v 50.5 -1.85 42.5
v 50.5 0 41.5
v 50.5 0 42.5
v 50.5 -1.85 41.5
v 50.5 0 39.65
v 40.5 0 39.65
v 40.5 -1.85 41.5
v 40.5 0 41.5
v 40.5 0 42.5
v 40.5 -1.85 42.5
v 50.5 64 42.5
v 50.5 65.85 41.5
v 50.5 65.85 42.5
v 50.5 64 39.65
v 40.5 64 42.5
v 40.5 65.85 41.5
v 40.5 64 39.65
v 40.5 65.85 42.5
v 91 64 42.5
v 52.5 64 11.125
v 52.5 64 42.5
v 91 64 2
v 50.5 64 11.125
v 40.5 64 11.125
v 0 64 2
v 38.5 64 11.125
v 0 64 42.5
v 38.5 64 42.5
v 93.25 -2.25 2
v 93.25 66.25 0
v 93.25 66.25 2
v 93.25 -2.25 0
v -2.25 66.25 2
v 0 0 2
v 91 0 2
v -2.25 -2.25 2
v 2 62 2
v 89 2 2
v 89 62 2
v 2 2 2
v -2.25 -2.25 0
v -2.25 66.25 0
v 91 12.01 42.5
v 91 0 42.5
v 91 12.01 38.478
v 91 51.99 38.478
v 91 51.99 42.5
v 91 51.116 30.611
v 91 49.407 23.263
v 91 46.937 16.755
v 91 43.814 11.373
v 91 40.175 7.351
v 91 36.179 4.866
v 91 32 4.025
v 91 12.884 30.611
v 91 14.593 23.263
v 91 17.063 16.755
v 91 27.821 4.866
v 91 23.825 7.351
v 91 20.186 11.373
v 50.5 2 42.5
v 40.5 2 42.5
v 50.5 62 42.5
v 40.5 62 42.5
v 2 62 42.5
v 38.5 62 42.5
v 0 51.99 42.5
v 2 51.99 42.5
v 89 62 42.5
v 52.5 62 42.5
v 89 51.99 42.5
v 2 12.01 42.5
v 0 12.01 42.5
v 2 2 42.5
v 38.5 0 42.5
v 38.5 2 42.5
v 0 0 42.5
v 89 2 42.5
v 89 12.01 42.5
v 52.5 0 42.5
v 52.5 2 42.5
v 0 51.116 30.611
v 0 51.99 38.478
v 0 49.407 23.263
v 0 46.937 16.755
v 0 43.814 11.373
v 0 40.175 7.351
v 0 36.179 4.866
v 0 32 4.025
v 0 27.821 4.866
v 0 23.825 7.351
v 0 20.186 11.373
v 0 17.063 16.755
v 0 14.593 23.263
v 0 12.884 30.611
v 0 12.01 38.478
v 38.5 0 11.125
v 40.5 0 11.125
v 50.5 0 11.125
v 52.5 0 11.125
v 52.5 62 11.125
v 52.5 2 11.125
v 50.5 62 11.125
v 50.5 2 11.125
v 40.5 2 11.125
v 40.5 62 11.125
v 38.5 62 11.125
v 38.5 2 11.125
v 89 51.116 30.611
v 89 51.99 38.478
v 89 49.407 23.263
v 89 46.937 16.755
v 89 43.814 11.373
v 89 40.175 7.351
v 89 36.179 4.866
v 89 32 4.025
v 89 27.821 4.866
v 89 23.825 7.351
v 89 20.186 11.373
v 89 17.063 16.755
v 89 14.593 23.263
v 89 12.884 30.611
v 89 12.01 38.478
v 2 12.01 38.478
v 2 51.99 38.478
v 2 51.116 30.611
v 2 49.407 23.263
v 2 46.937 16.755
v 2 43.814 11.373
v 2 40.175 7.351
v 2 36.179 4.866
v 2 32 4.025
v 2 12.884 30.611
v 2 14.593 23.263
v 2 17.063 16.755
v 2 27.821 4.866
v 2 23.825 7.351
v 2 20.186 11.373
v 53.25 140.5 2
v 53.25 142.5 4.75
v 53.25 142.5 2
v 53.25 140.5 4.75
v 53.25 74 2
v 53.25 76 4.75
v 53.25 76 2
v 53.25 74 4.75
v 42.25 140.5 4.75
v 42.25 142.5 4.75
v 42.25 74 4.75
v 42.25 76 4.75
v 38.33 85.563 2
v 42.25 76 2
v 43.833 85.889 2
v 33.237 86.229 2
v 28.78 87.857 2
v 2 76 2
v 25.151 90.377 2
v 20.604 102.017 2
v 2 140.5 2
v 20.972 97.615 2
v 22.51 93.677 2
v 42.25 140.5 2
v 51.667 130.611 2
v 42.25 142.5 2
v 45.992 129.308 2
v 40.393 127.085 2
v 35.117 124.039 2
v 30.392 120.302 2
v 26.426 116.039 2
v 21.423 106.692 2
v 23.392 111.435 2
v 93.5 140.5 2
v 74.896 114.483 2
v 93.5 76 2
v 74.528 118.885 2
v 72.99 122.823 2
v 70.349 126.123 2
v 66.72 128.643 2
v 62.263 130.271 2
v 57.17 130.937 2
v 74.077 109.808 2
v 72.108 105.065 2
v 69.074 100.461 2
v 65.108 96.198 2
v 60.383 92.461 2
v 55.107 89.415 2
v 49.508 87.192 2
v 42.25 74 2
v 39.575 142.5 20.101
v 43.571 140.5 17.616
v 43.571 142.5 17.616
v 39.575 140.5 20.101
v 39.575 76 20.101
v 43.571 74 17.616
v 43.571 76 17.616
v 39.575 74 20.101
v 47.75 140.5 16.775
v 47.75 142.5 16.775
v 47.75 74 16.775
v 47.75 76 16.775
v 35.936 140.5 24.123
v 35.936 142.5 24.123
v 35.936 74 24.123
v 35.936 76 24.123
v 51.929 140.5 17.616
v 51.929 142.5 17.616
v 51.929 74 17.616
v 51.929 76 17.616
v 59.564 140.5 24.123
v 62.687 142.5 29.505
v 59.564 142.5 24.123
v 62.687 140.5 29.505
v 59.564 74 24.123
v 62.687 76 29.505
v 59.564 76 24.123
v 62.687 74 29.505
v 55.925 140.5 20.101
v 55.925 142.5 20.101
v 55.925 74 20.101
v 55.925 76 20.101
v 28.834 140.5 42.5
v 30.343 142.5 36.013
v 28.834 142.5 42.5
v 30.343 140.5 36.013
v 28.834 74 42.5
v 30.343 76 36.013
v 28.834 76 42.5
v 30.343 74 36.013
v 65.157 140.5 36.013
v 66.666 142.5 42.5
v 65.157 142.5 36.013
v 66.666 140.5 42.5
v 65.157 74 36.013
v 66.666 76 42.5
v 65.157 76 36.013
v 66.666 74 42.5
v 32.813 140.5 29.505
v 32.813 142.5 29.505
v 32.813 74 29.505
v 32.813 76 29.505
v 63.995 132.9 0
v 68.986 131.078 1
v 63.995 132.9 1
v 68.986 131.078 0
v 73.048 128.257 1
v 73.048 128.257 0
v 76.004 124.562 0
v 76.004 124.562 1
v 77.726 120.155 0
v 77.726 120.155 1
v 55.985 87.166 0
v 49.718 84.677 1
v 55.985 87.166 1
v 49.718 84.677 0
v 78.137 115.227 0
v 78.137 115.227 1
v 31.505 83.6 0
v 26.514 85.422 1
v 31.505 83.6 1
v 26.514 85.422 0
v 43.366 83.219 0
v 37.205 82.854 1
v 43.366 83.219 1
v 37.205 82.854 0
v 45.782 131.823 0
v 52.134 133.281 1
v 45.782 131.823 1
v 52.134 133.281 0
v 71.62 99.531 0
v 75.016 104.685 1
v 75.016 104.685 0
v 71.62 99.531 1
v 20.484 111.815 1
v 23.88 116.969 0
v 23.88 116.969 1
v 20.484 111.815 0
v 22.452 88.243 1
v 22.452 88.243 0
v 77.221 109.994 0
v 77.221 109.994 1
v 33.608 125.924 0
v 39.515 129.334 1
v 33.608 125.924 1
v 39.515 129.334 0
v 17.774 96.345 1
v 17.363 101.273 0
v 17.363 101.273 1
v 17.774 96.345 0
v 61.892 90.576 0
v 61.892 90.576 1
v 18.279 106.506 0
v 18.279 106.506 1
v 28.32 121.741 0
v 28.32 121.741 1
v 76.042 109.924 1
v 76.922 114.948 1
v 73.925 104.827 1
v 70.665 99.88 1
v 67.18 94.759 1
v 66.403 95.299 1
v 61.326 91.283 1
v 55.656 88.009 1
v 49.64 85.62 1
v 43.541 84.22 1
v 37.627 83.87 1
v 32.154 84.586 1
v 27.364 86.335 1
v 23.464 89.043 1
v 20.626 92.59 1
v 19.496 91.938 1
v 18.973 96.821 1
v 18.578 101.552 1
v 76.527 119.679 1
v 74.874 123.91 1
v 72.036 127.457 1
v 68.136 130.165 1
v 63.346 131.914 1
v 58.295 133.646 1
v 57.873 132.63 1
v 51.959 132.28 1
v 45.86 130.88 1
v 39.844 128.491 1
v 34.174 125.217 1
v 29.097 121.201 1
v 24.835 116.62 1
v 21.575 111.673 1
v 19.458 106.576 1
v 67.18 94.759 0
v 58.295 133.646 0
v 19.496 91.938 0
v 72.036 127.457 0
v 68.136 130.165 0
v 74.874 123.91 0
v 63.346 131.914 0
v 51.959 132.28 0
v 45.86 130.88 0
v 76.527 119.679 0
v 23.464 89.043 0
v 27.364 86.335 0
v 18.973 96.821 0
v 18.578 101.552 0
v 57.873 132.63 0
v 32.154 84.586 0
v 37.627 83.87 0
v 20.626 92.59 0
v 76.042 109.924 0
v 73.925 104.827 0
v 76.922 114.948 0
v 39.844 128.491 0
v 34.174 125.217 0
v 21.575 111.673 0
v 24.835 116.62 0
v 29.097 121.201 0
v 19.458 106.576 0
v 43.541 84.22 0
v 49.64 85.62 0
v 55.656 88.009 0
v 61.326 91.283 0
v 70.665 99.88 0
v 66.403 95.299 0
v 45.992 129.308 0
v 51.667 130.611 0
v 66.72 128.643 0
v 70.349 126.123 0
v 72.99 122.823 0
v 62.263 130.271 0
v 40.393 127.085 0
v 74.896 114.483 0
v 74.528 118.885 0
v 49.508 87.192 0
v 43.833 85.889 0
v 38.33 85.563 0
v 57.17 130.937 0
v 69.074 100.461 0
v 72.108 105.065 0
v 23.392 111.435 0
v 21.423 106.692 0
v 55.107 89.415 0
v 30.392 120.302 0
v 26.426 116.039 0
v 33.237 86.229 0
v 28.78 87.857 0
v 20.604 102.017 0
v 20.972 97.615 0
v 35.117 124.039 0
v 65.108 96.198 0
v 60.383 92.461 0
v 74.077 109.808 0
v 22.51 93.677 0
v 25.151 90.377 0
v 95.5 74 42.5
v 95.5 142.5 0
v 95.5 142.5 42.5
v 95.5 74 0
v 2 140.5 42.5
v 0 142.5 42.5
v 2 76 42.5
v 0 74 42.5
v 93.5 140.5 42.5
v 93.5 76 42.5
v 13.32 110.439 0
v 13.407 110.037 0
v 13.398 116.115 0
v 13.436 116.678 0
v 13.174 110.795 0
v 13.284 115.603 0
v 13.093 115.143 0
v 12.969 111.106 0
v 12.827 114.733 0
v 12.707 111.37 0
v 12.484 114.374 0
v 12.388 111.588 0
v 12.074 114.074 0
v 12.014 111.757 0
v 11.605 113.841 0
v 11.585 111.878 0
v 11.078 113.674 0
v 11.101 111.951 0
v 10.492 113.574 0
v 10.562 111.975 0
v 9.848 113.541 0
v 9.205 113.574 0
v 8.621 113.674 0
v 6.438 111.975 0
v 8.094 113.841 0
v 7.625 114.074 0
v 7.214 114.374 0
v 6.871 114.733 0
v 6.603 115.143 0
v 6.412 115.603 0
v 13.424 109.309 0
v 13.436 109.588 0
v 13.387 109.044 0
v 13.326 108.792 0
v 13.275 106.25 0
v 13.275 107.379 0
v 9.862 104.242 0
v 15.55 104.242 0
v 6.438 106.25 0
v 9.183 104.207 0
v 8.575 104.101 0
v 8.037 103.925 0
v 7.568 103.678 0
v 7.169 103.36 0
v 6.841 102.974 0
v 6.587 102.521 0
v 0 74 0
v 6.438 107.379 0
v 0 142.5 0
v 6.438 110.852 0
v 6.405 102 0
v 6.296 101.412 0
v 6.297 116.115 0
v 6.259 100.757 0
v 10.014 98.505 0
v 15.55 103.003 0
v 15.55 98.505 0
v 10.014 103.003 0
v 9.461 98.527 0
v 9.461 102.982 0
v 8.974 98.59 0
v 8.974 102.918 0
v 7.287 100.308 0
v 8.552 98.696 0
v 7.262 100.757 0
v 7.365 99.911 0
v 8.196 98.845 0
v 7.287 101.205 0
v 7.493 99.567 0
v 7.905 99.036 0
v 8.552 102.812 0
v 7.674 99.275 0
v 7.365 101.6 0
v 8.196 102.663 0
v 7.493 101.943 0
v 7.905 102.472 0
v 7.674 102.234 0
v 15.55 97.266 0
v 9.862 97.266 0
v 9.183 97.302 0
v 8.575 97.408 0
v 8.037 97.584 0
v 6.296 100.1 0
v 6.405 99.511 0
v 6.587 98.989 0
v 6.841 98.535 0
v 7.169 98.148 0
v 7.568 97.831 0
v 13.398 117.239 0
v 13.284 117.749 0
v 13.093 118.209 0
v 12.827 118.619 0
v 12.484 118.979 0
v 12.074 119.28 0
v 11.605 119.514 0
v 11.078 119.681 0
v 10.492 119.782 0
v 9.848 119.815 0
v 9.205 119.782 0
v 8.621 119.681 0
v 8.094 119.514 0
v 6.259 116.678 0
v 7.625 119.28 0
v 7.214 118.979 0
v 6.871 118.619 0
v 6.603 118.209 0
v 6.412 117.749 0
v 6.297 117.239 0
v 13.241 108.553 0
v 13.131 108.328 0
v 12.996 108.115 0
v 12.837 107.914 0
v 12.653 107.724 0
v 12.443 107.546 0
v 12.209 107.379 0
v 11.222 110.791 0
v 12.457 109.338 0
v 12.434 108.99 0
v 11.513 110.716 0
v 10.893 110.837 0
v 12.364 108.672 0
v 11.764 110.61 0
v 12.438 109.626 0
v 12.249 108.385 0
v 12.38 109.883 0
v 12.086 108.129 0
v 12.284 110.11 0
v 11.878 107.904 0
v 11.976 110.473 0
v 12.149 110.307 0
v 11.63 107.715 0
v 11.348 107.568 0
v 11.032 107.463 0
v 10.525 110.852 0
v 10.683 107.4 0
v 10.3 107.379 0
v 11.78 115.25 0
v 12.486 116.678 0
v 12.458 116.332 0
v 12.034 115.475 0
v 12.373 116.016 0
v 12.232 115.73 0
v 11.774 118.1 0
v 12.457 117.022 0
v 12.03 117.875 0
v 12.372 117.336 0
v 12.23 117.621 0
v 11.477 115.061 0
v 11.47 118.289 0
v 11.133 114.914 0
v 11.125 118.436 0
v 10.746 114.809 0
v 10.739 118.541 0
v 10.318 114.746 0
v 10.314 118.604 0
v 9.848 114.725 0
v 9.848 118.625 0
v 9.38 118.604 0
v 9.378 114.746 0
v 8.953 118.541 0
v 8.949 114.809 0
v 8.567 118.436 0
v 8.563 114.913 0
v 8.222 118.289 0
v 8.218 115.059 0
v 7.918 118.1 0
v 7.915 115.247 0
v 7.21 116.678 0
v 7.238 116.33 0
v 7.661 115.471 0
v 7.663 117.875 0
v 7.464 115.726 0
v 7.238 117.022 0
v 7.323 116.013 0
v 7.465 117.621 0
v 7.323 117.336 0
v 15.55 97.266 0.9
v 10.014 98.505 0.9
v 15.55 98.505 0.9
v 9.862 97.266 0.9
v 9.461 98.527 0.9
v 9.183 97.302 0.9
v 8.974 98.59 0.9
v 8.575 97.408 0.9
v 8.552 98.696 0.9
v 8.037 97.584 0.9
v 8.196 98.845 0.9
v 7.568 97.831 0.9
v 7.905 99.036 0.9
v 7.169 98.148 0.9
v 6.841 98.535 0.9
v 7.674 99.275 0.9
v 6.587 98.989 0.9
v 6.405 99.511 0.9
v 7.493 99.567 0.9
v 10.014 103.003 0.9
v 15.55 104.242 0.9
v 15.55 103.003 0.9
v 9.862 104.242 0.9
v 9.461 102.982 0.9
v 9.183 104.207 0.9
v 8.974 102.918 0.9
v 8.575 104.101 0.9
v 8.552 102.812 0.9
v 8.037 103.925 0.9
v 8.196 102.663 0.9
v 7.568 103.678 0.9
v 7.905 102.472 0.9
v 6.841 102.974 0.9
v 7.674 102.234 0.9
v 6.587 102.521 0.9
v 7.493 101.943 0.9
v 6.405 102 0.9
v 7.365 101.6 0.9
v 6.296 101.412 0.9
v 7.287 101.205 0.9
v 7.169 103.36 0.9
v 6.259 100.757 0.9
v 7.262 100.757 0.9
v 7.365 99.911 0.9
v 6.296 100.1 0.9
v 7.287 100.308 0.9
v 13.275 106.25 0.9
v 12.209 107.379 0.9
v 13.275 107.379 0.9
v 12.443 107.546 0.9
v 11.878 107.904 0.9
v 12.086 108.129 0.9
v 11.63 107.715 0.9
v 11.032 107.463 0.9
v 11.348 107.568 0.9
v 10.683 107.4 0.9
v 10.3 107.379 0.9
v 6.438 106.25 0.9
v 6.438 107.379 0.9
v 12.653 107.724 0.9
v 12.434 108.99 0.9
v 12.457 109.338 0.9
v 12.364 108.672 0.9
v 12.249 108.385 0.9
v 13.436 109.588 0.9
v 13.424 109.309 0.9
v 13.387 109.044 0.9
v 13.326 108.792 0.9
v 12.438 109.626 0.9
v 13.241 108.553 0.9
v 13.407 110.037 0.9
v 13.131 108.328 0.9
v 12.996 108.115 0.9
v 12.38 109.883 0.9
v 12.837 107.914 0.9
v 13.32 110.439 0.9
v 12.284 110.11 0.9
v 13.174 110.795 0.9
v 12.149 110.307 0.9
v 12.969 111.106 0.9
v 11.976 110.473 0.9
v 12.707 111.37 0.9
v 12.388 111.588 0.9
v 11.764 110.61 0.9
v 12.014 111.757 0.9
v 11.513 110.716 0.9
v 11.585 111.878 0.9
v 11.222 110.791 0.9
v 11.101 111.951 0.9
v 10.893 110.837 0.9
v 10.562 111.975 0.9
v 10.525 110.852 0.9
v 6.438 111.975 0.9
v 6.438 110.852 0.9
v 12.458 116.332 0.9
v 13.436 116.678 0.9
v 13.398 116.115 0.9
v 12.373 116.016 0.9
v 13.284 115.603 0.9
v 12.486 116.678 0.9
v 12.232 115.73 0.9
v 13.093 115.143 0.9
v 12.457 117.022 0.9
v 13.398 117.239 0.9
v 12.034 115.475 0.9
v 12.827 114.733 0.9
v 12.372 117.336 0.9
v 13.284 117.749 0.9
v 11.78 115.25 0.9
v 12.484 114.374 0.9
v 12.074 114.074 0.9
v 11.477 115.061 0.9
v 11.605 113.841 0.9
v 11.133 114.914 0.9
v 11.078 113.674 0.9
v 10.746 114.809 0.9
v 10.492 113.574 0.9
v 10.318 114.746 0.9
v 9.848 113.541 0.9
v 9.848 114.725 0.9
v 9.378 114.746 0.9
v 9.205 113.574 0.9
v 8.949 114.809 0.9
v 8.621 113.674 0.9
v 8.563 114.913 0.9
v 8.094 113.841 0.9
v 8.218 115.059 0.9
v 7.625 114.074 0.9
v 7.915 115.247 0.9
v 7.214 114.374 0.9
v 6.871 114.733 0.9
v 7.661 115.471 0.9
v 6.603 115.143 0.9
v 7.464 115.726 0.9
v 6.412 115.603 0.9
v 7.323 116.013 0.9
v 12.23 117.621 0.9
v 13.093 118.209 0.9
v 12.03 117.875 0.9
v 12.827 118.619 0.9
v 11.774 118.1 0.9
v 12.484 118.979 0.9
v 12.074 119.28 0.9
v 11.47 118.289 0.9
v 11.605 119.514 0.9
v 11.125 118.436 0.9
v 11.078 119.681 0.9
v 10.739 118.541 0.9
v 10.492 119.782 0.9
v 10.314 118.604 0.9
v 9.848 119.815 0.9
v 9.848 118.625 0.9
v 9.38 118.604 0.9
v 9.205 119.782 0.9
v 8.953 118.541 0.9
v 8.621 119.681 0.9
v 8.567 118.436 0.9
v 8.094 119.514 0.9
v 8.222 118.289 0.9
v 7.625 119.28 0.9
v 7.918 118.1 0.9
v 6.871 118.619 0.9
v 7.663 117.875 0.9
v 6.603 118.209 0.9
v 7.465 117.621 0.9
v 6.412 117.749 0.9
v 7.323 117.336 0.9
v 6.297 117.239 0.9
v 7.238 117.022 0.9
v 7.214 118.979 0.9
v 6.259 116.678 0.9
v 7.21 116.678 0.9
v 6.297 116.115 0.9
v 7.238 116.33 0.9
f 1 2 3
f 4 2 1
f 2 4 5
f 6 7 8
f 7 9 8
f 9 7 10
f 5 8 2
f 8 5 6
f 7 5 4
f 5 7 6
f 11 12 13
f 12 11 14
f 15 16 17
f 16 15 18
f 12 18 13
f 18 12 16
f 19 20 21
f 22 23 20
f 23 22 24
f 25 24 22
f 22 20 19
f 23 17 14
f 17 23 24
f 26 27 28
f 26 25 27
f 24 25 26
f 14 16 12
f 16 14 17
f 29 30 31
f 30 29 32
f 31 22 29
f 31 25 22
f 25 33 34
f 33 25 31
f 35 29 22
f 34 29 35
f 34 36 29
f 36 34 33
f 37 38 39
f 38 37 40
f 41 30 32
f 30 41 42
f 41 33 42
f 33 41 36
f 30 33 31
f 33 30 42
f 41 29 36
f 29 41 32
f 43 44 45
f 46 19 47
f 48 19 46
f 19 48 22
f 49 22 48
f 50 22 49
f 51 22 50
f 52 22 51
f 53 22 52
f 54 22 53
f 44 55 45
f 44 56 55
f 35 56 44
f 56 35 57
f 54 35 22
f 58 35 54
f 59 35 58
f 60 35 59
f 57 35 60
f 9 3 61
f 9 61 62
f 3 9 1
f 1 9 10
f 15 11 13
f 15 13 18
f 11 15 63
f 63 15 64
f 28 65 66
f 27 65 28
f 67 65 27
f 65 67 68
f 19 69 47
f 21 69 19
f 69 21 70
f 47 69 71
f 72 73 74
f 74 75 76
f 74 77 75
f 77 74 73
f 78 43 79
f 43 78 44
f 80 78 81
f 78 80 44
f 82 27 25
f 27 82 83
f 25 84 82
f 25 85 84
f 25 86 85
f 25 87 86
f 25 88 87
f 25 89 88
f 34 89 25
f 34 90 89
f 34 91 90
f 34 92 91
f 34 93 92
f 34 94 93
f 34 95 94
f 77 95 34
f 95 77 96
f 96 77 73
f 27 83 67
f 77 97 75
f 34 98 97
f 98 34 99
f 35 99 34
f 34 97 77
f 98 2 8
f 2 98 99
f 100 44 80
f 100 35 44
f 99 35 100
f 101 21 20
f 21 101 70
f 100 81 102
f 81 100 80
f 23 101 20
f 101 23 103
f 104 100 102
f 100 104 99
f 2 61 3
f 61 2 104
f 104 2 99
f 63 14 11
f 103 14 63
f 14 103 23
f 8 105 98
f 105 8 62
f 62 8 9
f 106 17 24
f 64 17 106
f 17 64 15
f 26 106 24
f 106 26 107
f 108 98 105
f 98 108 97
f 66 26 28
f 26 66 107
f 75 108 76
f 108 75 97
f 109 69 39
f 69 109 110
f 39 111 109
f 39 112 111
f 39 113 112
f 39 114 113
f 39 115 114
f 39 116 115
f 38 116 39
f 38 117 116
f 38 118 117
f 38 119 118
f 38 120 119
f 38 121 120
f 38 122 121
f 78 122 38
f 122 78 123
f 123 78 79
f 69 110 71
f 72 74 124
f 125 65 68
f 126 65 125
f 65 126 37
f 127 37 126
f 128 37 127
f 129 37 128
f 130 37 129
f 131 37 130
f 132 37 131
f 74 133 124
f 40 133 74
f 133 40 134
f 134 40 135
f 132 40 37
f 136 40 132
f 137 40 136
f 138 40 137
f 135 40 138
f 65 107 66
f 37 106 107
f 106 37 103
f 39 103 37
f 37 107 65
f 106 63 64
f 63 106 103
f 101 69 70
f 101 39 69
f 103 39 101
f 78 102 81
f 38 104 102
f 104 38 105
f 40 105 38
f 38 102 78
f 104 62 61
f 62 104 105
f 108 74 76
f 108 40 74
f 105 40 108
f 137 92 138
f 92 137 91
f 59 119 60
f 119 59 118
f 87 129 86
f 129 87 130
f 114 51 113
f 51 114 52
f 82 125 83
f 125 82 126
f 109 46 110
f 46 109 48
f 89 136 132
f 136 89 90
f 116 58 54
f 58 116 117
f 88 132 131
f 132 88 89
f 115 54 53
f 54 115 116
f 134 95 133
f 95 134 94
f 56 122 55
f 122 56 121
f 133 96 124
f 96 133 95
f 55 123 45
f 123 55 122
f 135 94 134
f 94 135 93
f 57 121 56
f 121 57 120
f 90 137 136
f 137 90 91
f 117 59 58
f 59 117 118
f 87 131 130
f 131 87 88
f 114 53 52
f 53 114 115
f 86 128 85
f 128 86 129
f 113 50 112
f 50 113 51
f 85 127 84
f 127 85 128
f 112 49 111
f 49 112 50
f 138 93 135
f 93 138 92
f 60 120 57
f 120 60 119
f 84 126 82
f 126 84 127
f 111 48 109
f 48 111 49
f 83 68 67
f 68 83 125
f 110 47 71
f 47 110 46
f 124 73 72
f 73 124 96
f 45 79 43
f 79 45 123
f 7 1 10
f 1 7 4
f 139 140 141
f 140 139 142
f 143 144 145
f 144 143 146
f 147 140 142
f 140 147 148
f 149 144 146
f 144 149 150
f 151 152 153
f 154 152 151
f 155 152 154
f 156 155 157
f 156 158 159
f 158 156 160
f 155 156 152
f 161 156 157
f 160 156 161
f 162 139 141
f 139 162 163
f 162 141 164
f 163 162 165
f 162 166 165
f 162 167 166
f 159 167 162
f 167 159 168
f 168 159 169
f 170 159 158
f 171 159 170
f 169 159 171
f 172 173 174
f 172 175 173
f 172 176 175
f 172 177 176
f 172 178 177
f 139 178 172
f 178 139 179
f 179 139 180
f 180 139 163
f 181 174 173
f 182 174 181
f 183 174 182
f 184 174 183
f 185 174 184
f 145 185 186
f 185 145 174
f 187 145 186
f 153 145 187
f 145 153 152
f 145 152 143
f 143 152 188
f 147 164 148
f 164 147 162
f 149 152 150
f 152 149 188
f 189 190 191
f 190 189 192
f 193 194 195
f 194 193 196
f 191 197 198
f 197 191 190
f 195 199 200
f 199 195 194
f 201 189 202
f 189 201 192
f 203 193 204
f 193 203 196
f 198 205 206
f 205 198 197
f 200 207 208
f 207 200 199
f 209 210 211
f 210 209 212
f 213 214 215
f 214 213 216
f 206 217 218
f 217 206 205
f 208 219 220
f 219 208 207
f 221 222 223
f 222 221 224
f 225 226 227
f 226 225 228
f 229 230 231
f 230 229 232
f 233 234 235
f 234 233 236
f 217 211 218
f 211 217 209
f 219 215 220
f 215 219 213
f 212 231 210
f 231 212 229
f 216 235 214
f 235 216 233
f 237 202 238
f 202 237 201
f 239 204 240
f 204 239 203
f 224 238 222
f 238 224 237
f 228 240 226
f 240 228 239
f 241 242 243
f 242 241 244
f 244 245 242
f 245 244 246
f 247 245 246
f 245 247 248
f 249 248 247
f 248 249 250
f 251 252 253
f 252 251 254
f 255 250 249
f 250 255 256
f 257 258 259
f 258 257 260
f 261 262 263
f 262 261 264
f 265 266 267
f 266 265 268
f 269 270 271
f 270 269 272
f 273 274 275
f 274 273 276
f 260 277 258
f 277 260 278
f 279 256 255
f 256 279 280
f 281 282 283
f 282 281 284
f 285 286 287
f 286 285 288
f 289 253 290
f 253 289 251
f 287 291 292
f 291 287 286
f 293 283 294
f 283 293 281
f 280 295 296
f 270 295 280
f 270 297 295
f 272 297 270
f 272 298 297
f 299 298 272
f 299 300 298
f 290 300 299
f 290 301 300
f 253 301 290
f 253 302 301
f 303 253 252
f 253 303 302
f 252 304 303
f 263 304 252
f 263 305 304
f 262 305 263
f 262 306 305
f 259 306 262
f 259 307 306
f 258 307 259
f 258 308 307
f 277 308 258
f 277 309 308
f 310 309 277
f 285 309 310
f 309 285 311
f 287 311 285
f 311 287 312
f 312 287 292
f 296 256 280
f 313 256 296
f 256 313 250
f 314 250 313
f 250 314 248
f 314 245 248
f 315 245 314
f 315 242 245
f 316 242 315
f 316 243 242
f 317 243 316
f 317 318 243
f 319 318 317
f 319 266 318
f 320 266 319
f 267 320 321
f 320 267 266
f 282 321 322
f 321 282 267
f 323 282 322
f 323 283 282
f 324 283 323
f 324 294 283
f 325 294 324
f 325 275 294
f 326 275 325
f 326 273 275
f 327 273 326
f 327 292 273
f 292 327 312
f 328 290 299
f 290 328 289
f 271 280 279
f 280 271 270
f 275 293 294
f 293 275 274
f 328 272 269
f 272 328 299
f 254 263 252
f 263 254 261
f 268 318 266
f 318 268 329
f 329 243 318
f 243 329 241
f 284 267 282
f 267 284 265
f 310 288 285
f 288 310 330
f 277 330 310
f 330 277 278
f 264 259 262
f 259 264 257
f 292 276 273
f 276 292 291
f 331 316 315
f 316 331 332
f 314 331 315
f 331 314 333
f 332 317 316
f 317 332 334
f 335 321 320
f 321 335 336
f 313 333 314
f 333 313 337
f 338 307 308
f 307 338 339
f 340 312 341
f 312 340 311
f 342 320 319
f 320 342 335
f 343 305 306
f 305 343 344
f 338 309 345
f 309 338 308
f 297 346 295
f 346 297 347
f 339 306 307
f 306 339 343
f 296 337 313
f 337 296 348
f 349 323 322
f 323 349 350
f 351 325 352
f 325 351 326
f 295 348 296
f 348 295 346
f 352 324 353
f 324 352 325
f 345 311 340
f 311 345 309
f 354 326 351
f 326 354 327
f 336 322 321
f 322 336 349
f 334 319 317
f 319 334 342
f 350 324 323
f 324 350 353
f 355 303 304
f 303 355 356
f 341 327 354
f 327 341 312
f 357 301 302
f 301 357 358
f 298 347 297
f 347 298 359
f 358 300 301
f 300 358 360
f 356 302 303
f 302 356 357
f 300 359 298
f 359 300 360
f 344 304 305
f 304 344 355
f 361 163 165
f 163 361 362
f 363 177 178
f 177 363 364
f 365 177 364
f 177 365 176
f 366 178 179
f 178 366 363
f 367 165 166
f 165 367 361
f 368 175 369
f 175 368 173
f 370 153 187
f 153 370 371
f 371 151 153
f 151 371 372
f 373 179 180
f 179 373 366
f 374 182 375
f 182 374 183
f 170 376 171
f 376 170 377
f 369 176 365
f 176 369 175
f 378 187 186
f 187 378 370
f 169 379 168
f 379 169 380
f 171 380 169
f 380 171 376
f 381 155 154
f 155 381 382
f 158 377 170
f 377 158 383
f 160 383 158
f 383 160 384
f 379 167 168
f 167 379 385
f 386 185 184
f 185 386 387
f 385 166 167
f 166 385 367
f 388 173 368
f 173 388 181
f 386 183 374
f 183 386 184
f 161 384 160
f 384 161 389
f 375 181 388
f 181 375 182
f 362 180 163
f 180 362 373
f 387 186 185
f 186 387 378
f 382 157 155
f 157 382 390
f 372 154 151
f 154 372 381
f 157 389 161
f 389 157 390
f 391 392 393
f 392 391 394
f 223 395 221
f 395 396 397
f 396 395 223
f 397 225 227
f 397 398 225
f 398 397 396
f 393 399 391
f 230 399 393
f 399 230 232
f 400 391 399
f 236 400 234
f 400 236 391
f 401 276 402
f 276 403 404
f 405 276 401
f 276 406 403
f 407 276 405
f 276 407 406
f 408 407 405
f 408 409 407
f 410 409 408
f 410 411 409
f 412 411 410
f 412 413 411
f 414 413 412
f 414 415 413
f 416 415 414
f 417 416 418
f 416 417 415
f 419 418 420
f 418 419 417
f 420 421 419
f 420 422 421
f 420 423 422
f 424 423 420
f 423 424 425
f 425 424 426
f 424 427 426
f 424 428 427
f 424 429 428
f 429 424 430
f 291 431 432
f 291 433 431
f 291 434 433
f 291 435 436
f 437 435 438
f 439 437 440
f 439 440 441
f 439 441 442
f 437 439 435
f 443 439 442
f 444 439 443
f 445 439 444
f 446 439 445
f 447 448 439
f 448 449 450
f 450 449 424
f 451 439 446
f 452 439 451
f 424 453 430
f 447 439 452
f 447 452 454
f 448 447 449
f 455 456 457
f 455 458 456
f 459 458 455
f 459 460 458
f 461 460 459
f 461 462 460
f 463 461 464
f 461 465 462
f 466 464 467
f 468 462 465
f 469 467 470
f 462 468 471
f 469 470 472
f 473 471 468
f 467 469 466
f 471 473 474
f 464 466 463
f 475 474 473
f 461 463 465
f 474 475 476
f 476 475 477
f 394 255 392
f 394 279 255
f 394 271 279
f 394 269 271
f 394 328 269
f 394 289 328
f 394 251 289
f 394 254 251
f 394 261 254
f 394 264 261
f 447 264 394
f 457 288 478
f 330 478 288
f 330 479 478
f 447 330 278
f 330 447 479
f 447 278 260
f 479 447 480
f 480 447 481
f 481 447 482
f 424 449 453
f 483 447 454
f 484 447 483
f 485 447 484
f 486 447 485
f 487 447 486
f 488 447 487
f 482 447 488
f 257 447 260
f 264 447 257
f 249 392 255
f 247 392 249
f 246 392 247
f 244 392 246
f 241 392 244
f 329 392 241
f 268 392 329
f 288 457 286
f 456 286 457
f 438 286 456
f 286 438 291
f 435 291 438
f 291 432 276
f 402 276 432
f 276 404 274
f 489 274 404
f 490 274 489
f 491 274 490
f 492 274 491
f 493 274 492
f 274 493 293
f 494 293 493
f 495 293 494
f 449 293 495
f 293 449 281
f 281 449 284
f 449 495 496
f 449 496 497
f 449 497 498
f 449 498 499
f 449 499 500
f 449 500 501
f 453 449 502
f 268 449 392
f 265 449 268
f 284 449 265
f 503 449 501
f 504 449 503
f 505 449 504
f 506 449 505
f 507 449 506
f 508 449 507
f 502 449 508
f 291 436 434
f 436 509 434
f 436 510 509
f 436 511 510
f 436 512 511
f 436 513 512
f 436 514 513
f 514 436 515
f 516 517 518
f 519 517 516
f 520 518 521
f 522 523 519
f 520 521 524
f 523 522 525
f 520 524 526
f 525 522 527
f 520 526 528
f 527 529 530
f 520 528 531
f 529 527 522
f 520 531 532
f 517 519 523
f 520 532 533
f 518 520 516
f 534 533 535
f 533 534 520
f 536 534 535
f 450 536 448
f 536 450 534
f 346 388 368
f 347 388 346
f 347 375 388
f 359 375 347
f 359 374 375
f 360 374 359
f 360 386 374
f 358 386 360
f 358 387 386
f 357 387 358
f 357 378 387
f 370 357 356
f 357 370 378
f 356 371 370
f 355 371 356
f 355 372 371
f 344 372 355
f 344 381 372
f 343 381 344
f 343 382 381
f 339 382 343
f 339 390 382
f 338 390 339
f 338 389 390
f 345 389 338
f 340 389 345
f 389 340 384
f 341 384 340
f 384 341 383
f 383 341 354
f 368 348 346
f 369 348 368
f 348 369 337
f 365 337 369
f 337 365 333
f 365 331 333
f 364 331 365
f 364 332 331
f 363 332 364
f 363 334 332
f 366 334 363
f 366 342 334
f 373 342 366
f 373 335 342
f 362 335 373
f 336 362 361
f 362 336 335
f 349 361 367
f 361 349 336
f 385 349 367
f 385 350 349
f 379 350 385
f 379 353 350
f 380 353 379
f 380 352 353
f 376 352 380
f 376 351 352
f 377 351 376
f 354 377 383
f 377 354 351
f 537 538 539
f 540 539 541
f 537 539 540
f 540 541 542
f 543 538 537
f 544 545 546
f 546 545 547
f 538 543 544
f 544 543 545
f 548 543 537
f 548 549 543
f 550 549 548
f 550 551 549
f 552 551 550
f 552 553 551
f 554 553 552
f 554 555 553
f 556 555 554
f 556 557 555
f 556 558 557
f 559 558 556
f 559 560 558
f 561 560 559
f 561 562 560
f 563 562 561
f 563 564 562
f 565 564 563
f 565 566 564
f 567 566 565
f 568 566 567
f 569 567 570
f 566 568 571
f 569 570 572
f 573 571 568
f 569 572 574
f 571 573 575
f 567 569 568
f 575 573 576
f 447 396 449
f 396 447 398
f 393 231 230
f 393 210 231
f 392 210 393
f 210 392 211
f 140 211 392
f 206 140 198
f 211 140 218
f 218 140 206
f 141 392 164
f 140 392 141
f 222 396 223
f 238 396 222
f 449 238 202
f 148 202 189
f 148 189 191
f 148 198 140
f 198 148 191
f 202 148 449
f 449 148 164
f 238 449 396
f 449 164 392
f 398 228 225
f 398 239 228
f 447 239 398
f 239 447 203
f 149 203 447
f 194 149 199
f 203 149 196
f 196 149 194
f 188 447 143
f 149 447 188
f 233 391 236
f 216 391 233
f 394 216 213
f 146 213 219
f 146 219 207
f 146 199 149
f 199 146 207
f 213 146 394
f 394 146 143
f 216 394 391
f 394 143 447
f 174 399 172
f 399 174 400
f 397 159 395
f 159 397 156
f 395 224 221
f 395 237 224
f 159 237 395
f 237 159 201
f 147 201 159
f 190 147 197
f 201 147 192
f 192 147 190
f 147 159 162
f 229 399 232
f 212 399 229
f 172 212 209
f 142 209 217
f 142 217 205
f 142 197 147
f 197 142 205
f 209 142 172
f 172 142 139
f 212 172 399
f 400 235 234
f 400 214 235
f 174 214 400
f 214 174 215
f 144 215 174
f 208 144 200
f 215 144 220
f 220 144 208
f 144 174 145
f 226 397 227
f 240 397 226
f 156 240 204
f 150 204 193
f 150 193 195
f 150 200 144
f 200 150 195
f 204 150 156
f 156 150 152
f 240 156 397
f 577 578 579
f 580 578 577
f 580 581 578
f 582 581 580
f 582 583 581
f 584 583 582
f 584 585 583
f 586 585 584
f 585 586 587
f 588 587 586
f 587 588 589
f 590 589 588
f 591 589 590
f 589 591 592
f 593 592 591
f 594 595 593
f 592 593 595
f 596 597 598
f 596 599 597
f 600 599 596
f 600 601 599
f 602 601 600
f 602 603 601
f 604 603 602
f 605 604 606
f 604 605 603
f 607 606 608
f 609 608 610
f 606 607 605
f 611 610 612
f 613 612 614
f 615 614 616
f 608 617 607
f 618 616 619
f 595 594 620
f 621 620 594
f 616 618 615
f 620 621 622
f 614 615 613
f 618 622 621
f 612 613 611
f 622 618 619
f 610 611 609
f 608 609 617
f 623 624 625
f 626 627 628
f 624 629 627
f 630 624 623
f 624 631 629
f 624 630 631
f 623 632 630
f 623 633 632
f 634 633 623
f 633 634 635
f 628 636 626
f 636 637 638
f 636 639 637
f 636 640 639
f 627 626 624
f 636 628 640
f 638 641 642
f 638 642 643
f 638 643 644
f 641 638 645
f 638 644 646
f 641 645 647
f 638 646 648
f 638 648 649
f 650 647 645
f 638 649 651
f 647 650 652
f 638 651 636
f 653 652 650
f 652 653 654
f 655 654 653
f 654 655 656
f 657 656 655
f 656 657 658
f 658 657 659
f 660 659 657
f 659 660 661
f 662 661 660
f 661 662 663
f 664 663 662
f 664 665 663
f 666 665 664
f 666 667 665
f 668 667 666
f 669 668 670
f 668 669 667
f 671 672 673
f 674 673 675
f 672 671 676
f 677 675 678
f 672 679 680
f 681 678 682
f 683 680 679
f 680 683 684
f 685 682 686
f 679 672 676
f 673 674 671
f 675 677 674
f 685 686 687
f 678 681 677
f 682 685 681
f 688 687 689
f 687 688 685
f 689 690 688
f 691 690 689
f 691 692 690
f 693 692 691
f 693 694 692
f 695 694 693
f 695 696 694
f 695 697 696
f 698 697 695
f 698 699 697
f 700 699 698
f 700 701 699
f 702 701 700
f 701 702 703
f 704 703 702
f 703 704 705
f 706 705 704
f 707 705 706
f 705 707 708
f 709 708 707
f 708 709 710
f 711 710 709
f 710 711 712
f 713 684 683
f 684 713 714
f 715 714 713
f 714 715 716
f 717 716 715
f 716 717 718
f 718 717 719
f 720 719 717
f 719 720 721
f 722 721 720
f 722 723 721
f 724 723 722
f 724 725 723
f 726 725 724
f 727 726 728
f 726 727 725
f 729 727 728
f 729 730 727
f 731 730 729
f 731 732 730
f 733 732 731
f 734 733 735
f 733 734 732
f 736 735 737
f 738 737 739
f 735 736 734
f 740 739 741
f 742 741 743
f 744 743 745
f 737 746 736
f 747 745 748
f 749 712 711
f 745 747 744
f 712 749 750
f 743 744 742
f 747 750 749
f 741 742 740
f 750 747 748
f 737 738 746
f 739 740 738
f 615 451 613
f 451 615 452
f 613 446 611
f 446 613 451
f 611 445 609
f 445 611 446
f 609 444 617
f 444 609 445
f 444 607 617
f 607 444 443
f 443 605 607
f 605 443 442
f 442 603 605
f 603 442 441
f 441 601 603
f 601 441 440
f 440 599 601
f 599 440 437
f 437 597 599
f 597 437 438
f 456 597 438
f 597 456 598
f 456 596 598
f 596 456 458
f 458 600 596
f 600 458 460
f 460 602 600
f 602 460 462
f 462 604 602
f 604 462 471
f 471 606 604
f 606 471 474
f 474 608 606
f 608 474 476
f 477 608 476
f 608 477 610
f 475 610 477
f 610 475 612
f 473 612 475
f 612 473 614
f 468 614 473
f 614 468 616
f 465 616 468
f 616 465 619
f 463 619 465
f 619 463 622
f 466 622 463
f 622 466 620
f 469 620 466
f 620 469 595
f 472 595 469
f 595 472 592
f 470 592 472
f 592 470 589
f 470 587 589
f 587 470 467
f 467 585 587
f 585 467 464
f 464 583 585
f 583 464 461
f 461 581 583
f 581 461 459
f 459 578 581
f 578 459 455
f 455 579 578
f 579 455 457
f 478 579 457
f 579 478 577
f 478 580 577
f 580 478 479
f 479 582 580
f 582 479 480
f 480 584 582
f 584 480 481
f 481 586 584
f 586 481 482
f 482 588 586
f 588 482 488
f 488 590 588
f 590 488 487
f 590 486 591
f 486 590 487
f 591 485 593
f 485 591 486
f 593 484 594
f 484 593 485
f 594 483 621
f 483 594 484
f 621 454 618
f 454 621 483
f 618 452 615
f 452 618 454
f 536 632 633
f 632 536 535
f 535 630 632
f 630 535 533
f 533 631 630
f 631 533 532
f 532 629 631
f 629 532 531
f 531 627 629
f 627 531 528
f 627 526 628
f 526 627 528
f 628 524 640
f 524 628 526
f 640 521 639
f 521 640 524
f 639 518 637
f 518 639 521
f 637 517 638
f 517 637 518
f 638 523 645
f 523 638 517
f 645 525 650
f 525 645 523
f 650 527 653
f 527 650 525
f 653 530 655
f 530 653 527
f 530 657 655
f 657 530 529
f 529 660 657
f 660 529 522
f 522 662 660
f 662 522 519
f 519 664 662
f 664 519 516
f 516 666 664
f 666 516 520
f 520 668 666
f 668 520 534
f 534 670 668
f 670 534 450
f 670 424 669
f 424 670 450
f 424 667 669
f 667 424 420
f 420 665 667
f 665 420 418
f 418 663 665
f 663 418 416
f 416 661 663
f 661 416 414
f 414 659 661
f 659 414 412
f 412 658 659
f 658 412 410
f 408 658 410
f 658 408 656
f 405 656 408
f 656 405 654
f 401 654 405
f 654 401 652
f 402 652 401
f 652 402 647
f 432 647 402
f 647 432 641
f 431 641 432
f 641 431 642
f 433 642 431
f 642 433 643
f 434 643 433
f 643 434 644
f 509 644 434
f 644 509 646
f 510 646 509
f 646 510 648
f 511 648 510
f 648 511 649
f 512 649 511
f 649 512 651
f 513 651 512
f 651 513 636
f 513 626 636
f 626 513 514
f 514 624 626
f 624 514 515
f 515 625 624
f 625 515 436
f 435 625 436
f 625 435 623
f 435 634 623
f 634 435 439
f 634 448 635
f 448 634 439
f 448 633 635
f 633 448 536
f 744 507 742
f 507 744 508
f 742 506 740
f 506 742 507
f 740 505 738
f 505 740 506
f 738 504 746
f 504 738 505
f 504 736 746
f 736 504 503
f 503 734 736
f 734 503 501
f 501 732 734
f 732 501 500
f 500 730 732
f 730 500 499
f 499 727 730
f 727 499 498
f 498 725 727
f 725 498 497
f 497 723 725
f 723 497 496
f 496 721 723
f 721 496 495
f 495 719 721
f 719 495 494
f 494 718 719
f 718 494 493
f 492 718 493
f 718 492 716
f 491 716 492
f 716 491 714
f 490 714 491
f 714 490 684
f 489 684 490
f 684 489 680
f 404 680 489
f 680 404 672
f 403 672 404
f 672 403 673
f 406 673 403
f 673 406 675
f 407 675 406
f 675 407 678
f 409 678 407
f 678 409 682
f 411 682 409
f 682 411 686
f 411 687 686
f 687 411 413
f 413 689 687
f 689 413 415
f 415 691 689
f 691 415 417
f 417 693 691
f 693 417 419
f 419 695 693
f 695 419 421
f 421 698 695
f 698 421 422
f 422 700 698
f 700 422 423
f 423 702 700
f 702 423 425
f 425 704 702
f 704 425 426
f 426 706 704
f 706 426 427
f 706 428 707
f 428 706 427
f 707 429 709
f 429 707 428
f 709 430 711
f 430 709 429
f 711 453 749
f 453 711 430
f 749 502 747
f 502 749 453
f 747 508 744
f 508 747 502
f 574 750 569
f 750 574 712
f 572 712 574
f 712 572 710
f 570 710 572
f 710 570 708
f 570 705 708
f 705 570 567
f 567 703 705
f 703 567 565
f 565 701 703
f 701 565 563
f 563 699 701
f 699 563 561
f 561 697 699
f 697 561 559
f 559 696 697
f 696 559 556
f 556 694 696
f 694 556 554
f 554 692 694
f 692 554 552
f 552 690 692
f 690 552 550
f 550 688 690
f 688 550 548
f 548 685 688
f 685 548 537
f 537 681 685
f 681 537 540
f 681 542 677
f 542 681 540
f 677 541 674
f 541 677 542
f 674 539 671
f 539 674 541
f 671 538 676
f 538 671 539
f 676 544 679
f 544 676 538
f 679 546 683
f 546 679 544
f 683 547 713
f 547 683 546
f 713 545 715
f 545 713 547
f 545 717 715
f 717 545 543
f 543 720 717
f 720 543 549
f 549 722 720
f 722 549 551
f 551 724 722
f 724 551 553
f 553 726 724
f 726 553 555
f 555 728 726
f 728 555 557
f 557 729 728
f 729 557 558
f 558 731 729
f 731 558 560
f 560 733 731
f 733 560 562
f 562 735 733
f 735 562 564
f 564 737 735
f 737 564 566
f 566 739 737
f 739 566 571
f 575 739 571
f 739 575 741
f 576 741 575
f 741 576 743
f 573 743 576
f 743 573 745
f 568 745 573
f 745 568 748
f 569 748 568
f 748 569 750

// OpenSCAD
//Type to print
type="both"; //[bottom,top,both]



//UNO-Full-Stack:    
Long_edge=85.5; Short_edge=55.3; Height=39;

//UNO-Junior (bigger cards, smaller stack)
//Long_edge=90; Short_edge=59; Height=17;


wiggle=1.5;

//Width of the tab which keeps the two halfes together
TAB_THICKNESS = 10;

//wedge size at end of tab. Has to be less than "wall_thickness" above!
Wedge_thickness=1.6;
    
//Card size long edge
CARD_SIZE_LONG_EDGE =Long_edge+wiggle;

//Card size short edge
CARD_SIZE_SHORT_EDGE = Short_edge+wiggle+2*Wedge_thickness;

//Card stack total height
CARD_STACK_HEIGHT = Height+wiggle  ;

//Wall thickness of the box, e.g. 2mm
WALL_THICKNESS = 2;

//wiggle space so the boxes slide easily on top of each other.
EXTRA_SPACE = .25;

//Is there a hole in the top?
Cutout_hole_top = "true"; //[true, false]

//Is there a hole in the bottom?
Cutout_hole_bottom = "false"; //[true, false]

//Angle of the cutout (looks nice)
Cutout_angle=30;

//Set the text to render on the top lid
Top_Text = "Uno";
 
//Bottom text
Bottom_Text = "";

//Set text size in mm
textsize=9; 

//Font name, e.g. "Libration Sans", "Aldo", depends on what is available on the platform. In the customizer,choose from about 700 Google Fonts. For an overview please refer: http://www.google.com/fonts
fontname="Orbitron"; //[ABeeZee,Abel,Abril Fatface,Aclonica,Acme,Actor,Adamina,Advent Pro,Aguafina Script,Akronim,Aladin,Aldrich,Alef,Alegreya,Alegreya Sans,Alegreya Sans SC,Alegreya SC,Alex Brush,Alfa Slab One,Alice,Alike,Alike Angular,Allan,Allerta,Allerta Stencil,Allura,Almendra,Almendra Display,Almendra SC,Amarante,Amaranth,Amatic SC,Amethysta,Amiri,Anaheim,Andada,Andika,Angkor,Annie Use Your Telescope,Anonymous Pro,Antic,Antic Didone,Antic Slab,Anton,Arapey,Arbutus,Arbutus Slab,Architects Daughter,Archivo Black,Archivo Narrow,Arimo,Arizonia,Armata,Artifika,Arvo,Asap,Asset,Astloch,Asul,Atomic Age,Aubrey,Audiowide,Autour One,Average,Average Sans,Averia Gruesa Libre,Averia Libre,Averia Sans Libre,Averia Serif Libre,Bad Script,Balthazar,Bangers,Basic,Battambang,Baumans,Bayon,Belgrano,Belleza,BenchNine,Bentham,Berkshire Swash,Bevan,Bigelow Rules,Bigshot One,Bilbo,Bilbo Swash Caps,Bitter,Black Ops One,Bokor,Bonbon,Boogaloo,Bowlby One,Bowlby One SC,Brawler,Bree Serif,Bubblegum Sans,Bubbler One,Buda,Buenard,Butcherman,Butterfly Kids,Cabin,Cabin Condensed,Cabin Sketch,Caesar Dressing,Cagliostro,Calligraffitti,Cambay,Cambo,Candal,Cantarell,Cantata One,Cantora One,Capriola,Cardo,Carme,Carrois Gothic,Carrois Gothic SC,Carter One,Caudex,Cedarville Cursive,Ceviche One,Changa One,Chango,Chau Philomene One,Chela One,Chelsea Market,Chenla,Cherry Cream Soda,Cherry Swash,Chewy,Chicle,Chivo,Cinzel,Cinzel Decorative,Clicker Script,Coda,Coda Caption,Codystar,Combo,Comfortaa,Coming Soon,Concert One,Condiment,Content,Contrail One,Convergence,Cookie,Copse,Corben,Courgette,Cousine,Coustard,Covered By Your Grace,Crafty Girls,Creepster,Crete Round,Crimson Text,Croissant One,Crushed,Cuprum,Cutive,Cutive Mono,Damion,Dancing Script,Dangrek,Dawning of a New Day,Days One,Dekko,Delius,Delius Swash Caps,Delius Unicase,Della Respira,Denk One,Devonshire,Dhurjati,Didact Gothic,Diplomata,Diplomata SC,Domine,Donegal One,Doppio One,Dorsa,Dosis,Dr Sugiyama,Droid Sans,Droid Sans Mono,Droid Serif,Duru Sans,Dynalight,Eagle Lake,Eater,EB Garamond,Economica,Ek Mukta,Electrolize,Elsie,Elsie Swash Caps,Emblema One,Emilys Candy,Engagement,Englebert,Enriqueta,Erica One,Esteban,Euphoria Script,Ewert,Exo,Exo 2,Expletus Sans,Fanwood Text,Fascinate,Fascinate Inline,Faster One,Fasthand,Fauna One,Federant,Federo,Felipa,Fenix,Finger Paint,Fira Mono,Fira Sans,Fjalla One,Fjord One,Flamenco,Flavors,Fondamento,Fontdiner Swanky,Forum,Francois One,Freckle Face,Fredericka the Great,Fredoka One,Freehand,Fresca,Frijole,Fruktur,Fugaz One,Gabriela,Gafata,Galdeano,Galindo,Gentium Basic,Gentium Book Basic,Geo,Geostar,Geostar Fill,Germania One,GFS Didot,GFS Neohellenic,Gidugu,Gilda Display,Give You Glory,Glass Antiqua,Glegoo,Gloria Hallelujah,Goblin One,Gochi Hand,Gorditas,Goudy Bookletter 1911,Graduate,Grand Hotel,Gravitas One,Great Vibes,Griffy,Gruppo,Gudea,Gurajada,Habibi,Halant,Hammersmith One,Hanalei,Hanalei Fill,Handlee,Hanuman,Happy Monkey,Headland One,Henny Penny,Herr Von Muellerhoff,Hind,Holtwood One SC,Homemade Apple,Homenaje,Iceberg,Iceland,IM Fell Double Pica,IM Fell Double Pica SC,IM Fell DW Pica,IM Fell DW Pica SC,IM Fell English,IM Fell English SC,IM Fell French Canon,IM Fell French Canon SC,IM Fell Great Primer,IM Fell Great Primer SC,Imprima,Inconsolata,Inder,Indie Flower,Inika,Irish Grover,Istok Web,Italiana,Italianno,Jacques Francois,Jacques Francois Shadow,Jim Nightshade,Jockey One,Jolly Lodger,Josefin Sans,Josefin Slab,Joti One,Judson,Julee,Julius Sans One,Junge,Jura,Just Another Hand,Just Me Again Down Here,Kalam,Kameron,Kantumruy,Karla,Karma,Kaushan Script,Kavoon,Kdam Thmor,Keania One,Kelly Slab,Kenia,Khand,Khmer,Khula,Kite One,Knewave,Kotta One,Koulen,Kranky,Kreon,Kristi,Krona One,La Belle Aurore,Laila,Lakki Reddy,Lancelot,Lateef,Lato,League Script,Leckerli One,Ledger,Lekton,Lemon,Liberation Sans,Libre Baskerville,Life Savers,Lilita One,Lily Script One,Limelight,Linden Hill,Lobster,Lobster Two,Londrina Outline,Londrina Shadow,Londrina Sketch,Londrina Solid,Lora,Love Ya Like A Sister,Loved by the King,Lovers Quarrel,Luckiest Guy,Lusitana,Lustria,Macondo,Macondo Swash Caps,Magra,Maiden Orange,Mako,Mallanna,Mandali,Marcellus,Marcellus SC,Marck Script,Margarine,Marko One,Marmelad,Martel Sans,Marvel,Mate,Mate SC,Maven Pro,McLaren,Meddon,MedievalSharp,Medula One,Megrim,Meie Script,Merienda,Merienda One,Merriweather,Merriweather Sans,Metal,Metal Mania,Metamorphous,Metrophobic,Michroma,Milonga,Miltonian,Miltonian Tattoo,Miniver,Miss Fajardose,Modak,Modern Antiqua,Molengo,Molle,Monda,Monofett,Monoton,Monsieur La Doulaise,Montaga,Montez,Montserrat,Montserrat Alternates,Montserrat Subrayada,Moul,Moulpali,Mountains of Christmas,Mouse Memoirs,Mr Bedfort,Mr Dafoe,Mr De Haviland,Mrs Saint Delafield,Mrs Sheppards,Muli,Mystery Quest,Neucha,Neuton,New Rocker,News Cycle,Niconne,Nixie One,Nobile,Nokora,Norican,Nosifer,Nothing You Could Do,Noticia Text,Noto Sans,Noto Serif,Nova Cut,Nova Flat,Nova Mono,Nova Oval,Nova Round,Nova Script,Nova Slim,Nova Square,NTR,Numans,Nunito,Odor Mean Chey,Offside,Old Standard TT,Oldenburg,Oleo Script,Oleo Script Swash Caps,Open Sans,Open Sans Condensed,Oranienbaum,Orbitron,Oregano,Orienta,Original Surfer,Oswald,Over the Rainbow,Overlock,Overlock SC,Ovo,Oxygen,Oxygen Mono,Pacifico,Paprika,Parisienne,Passero One,Passion One,Pathway Gothic One,Patrick Hand,Patrick Hand SC,Patua One,Paytone One,Peddana,Peralta,Permanent Marker,Petit Formal Script,Petrona,Philosopher,Piedra,Pinyon Script,Pirata One,Plaster,Play,Playball,Playfair Display,Playfair Display SC,Podkova,Poiret One,Poller One,Poly,Pompiere,Pontano Sans,Port Lligat Sans,Port Lligat Slab,Prata,Preahvihear,Press Start 2P,Princess Sofia,Prociono,Prosto One,PT Mono,PT Sans,PT Sans Caption,PT Sans Narrow,PT Serif,PT Serif Caption,Puritan,Purple Purse,Quando,Quantico,Quattrocento,Quattrocento Sans,Questrial,Quicksand,Quintessential,Qwigley,Racing Sans One,Radley,Rajdhani,Raleway,Raleway Dots,Ramabhadra,Ramaraja,Rambla,Rammetto One,Ranchers,Rancho,Ranga,Rationale,Ravi Prakash,Redressed,Reenie Beanie,Revalia,Ribeye,Ribeye Marrow,Righteous,Risque,Roboto,Roboto Condensed,Roboto Slab,Rochester,Rock Salt,Rokkitt,Romanesco,Ropa Sans,Rosario,Rosarivo,Rouge Script,Rozha One,Rubik Mono One,Rubik One,Ruda,Rufina,Ruge Boogie,Ruluko,Rum Raisin,Ruslan Display,Russo One,Ruthie,Rye,Sacramento,Sail,Salsa,Sanchez,Sancreek,Sansita One,Sarina,Sarpanch,Satisfy,Scada,Scheherazade,Schoolbell,Seaweed Script,Sevillana,Seymour One,Shadows Into Light,Shadows Into Light Two,Shanti,Share,Share Tech,Share Tech Mono,Shojumaru,Short Stack,Siemreap,Sigmar One,Signika,Signika Negative,Simonetta,Sintony,Sirin Stencil,Six Caps,Skranji,Slabo 13px,Slabo 27px,Slackey,Smokum,Smythe,Sniglet,Snippet,Snowburst One,Sofadi One,Sofia,Sonsie One,Sorts Mill Goudy,Source Code Pro,Source Sans Pro,Source Serif Pro,Special Elite,Spicy Rice,Spinnaker,Spirax,Squada One,Sree Krushnadevaraya,Stalemate,Stalinist One,Stardos Stencil,Stint Ultra Condensed,Stint Ultra Expanded,Stoke,Strait,Sue Ellen Francisco,Sunshiney,Supermercado One,Suranna,Suravaram,Suwannaphum,Swanky and Moo Moo,Syncopate,Tangerine,Taprom,Tauri,Teko,Telex,Tenali Ramakrishna,Tenor Sans,Text Me One,The Girl Next Door,Tienne,Timmana,Tinos,Titan One,Titillium Web,Trade Winds,Trocchi,Trochut,Trykker,Tulpen One,Ubuntu,Ubuntu Condensed,Ubuntu Mono,Ultra,Uncial Antiqua,Underdog,Unica One,UnifrakturCook,UnifrakturMaguntia,Unkempt,Unlock,Unna,Vampiro One,Varela,Varela Round,Vast Shadow,Vesper Libre,Vibur,Vidaloka,Viga,Voces,Volkhov,Vollkorn,Voltaire,VT323,Waiting for the Sunrise,Wallpoet,Walter Turncoat,Warnes,Wellfleet,Wendy One,Wire One,Yanone Kaffeesatz,Yellowtail,Yeseva One,Yesteryear,Zeyada]

// rounded cutouts remove a "circle" from the bottom surface, and a 1/2 "circle" from each short end of the bottom piece

/* [Cutouts] */
// Percent of card deck height to cutout
END_CUTOUT_HEIGHT_PERCENTAGE = 95; // [0:100]

// Percent of box width to cutout
END_CUTOUT_WIDTH_PERCENTAGE  = 67; // [0:100]

// Percent of box width to cutout
BOTTOM_CUTOUT_WIDTH_PERCENTAGE = 67; // [0:100]

// percent of box length to cutout
BOTTOM_CUTOUT_LENGTH_PERCENTAGE = 67; // [0:100]
// preview[view:south west, tilt:top diagonal]

/* [Hidden] */
//-------------------------------------------------------------------------------

/*
Customizable card box

Remixed from:

https://www.thingiverse.com/thing:137961
"Customizable Card Box with Cutouts" 
by JeremyVS Aug 22, 2013 

which was remixed from:

https://www.thingiverse.com/thing:92518
"Parametric Card Box"
by zxqueb May 24, 2013 
 
Version 5, March 2019
remixed by MC Geisler (mcgenki at gmail dot com)

customizable card box:
- you can specify wether you want cutouts in the top or bottom lid
- you can rotate the cutouts
- you can put a customizable text on the top and bottom lid
- top and bottom can be generated separately

Changed:
- the top and bottom box are more compact to print together
- the oval has a step at 0.85 mm, so you can change the filament there and get a colored text and oval
- Additional cutouts on the side to open the box a bit easier (you can press in the tabs which hold the shells together)

Have fun!

License: Attribution 4.0 International (CC BY 4.0)

You are free to:
    Share - copy and redistribute the material in any medium or format
    Adapt - remix, transform, and build upon the material
    for any purpose, even commercially.
*/



CARD_LONG_EDGE = CARD_SIZE_LONG_EDGE + (WALL_THICKNESS*2);
CARD_SHORT_EDGE = CARD_SIZE_SHORT_EDGE + (WALL_THICKNESS*2);
ALL_EXTRA_SPACE = (EXTRA_SPACE *2);

LID_OUTSIDE_LONG_THICKNESS = CARD_LONG_EDGE + (WALL_THICKNESS*2);
LID_OUTSIDE_SHORT_THICKNESS = CARD_SHORT_EDGE + (WALL_THICKNESS*2);

SPACE_BETWEEN_BOTTOM_AND_LID_Y = LID_OUTSIDE_SHORT_THICKNESS + (WALL_THICKNESS*2)+ 2;

HEIGHT = CARD_STACK_HEIGHT + WALL_THICKNESS;

// rounded cut-outs
// ends
END_CUTOUT_LENGTH = CARD_LONG_EDGE + 2;
END_CUTOUT_RADIUS = CARD_STACK_HEIGHT * END_CUTOUT_HEIGHT_PERCENTAGE/100;
END_CUTOUT_WIDTH  = CARD_SIZE_SHORT_EDGE * END_CUTOUT_WIDTH_PERCENTAGE/100;
// since we'll be scaling our cylinder, we really need the ratio to scale by for the longer dimension, not the direct dimension itself
END_CUTOUT_WIDTH_RATIO = END_CUTOUT_WIDTH / (END_CUTOUT_RADIUS*2);
// bottom
BOTTOM_CUTOUT_LENGTH = (WALL_THICKNESS * 2)+ 2;
BOTTOM_CUTOUT_RADIUS = CARD_SIZE_SHORT_EDGE * BOTTOM_CUTOUT_WIDTH_PERCENTAGE / 2 /100;
BOTTOM_CUTOUT_HEIGHT = CARD_SIZE_LONG_EDGE * BOTTOM_CUTOUT_LENGTH_PERCENTAGE/100;
// since we'll be scaling our cylinder, we really need the ratio to scale by for the longer dimension, not the direct dimension itself
BOTTOM_CUTOUT_HEIGHT_RATIO = BOTTOM_CUTOUT_HEIGHT / (BOTTOM_CUTOUT_RADIUS*2);

module writetext(textstr, sizeit)
{
        text(textstr,size=sizeit,font=fontname,halign="center",valign="center");
}

module cutout_ellipse()
{
    translate([0,0,-WALL_THICKNESS*0]) 
        rotate([0,0,Cutout_angle])
                scale([BOTTOM_CUTOUT_HEIGHT_RATIO,1,1]) 
                {    
                    translate([0,0,-1])
                        cylinder(h=WALL_THICKNESS+2,r=BOTTOM_CUTOUT_RADIUS);  //* cutout 
                    
                    difference()
                    {
                        translate([0,0,-1])
                            cylinder(h=WALL_THICKNESS/2+1,r=BOTTOM_CUTOUT_RADIUS+WALL_THICKNESS*1.2);//cutout outer - sunken in
                        translate([0,0,-1])
                            cylinder(h=WALL_THICKNESS+2,r=BOTTOM_CUTOUT_RADIUS+WALL_THICKNESS*.75);//cutout inner                          
                    }
                }
}

module writeit(text)
{
    rotate([0,0,-90])
        scale([-1,1,1])
            linear_extrude(height=WALL_THICKNESS/2, twist=0, slices=1, $fn=32, convexity = 32   )     
                writetext(text, textsize);
}


module bottom()
{    
     //*Start wedge 1
    translate ([((CARD_LONG_EDGE/2) -(TAB_THICKNESS/2)),-Wedge_thickness-EXTRA_SPACE,HEIGHT-WALL_THICKNESS-1-EXTRA_SPACE]) 

    difference ()
    {
        cube ([TAB_THICKNESS,Wedge_thickness+EXTRA_SPACE,WALL_THICKNESS+EXTRA_SPACE]);
        
        translate ([0, WALL_THICKNESS+(EXTRA_SPACE),0]) 
            rotate ([135,0,0])  
                cube ([(TAB_THICKNESS+3), sqrt(((WALL_THICKNESS+EXTRA_SPACE)*(WALL_THICKNESS+EXTRA_SPACE))+((WALL_THICKNESS+EXTRA_SPACE)*(WALL_THICKNESS+EXTRA_SPACE))), sqrt(((WALL_THICKNESS+EXTRA_SPACE)*(WALL_THICKNESS+EXTRA_SPACE))+((WALL_THICKNESS+EXTRA_SPACE)*(WALL_THICKNESS+EXTRA_SPACE)))]);

    }

    //*Start wedge 2
    translate ([((CARD_LONG_EDGE/2) - (TAB_THICKNESS/2)),CARD_SHORT_EDGE,HEIGHT-Wedge_thickness-1-EXTRA_SPACE])
        difference (){
            cube ([TAB_THICKNESS,Wedge_thickness+EXTRA_SPACE,WALL_THICKNESS+EXTRA_SPACE]);

            translate ([0 ,0 ,0]) rotate ([-45,0,0])  cube ([(TAB_THICKNESS+3),sqrt(((WALL_THICKNESS+EXTRA_SPACE)*(WALL_THICKNESS+EXTRA_SPACE))+((WALL_THICKNESS+EXTRA_SPACE)*(WALL_THICKNESS+EXTRA_SPACE))),sqrt(((WALL_THICKNESS+EXTRA_SPACE)*(WALL_THICKNESS+EXTRA_SPACE))+((WALL_THICKNESS+EXTRA_SPACE)*(WALL_THICKNESS+EXTRA_SPACE)))]);
        }

    translate ([((CARD_LONG_EDGE/2) -(TAB_THICKNESS/2)),-Wedge_thickness-EXTRA_SPACE,HEIGHT-1])  
        cube ([TAB_THICKNESS, Wedge_thickness+EXTRA_SPACE, 1]); 					//*Tab

    translate ([((CARD_LONG_EDGE/2) -(TAB_THICKNESS/2)),CARD_SHORT_EDGE,HEIGHT-1])  
        cube ([TAB_THICKNESS, Wedge_thickness+EXTRA_SPACE, 1]);				//*Tab

    difference()
    {
        translate ([-WALL_THICKNESS-EXTRA_SPACE, -WALL_THICKNESS-EXTRA_SPACE, 0 ]) 
            cube ([CARD_LONG_EDGE + (WALL_THICKNESS*2)+ALL_EXTRA_SPACE, CARD_SHORT_EDGE + (WALL_THICKNESS*2)+ALL_EXTRA_SPACE, WALL_THICKNESS]);  						//*Bottom Plate

        if (Cutout_hole_bottom == "true")
        {
            translate([CARD_LONG_EDGE/2,CARD_SHORT_EDGE/2,0]) 
                cutout_ellipse();
        }
        
        translate([textsize*1.2,(LID_OUTSIDE_SHORT_THICKNESS+ALL_EXTRA_SPACE)/2-WALL_THICKNESS-EXTRA_SPACE,-.1]) 
            writeit(Bottom_Text);
    }

    difference() 
    {
        cube ([CARD_LONG_EDGE,CARD_SHORT_EDGE,HEIGHT]);		//*Main Body

        translate([ ((CARD_LONG_EDGE / 2) + (TAB_THICKNESS/2)), -.5, ((HEIGHT+ WALL_THICKNESS) / 4) ]) 
            cube ([2, CARD_SHORT_EDGE + 2, HEIGHT]);	//*Tab cutout
        
        translate([ ((CARD_LONG_EDGE / 2) - ((TAB_THICKNESS/2)+2)), -.5, ((HEIGHT+ WALL_THICKNESS)/ 4) ]) 
            cube ([2, CARD_SHORT_EDGE + 2, HEIGHT ]);  //*Tab cutout

        translate([WALL_THICKNESS,WALL_THICKNESS,WALL_THICKNESS]) 
            cube ([CARD_LONG_EDGE - (WALL_THICKNESS*2),CARD_SHORT_EDGE - (WALL_THICKNESS*2),HEIGHT]);			//*Hole

        translate([-WALL_THICKNESS/2,CARD_SHORT_EDGE/2,HEIGHT]) scale([1,END_CUTOUT_WIDTH_RATIO,1])
            rotate([0,90,0]) 
                cylinder(h=END_CUTOUT_LENGTH,r=END_CUTOUT_RADIUS);  //*End cutout

        if (Cutout_hole_bottom == "true")
        {    
            translate([CARD_LONG_EDGE/2,CARD_SHORT_EDGE/2,0]) 
                cutout_ellipse(); //*Bottom cutout to cut through main box
        }
        
        translate([textsize*1.2,(LID_OUTSIDE_SHORT_THICKNESS+ALL_EXTRA_SPACE)/2-WALL_THICKNESS-EXTRA_SPACE,-.1]) 
            writeit(Bottom_Text);
    }
}


//------------------------
module top()
{
    difference() 
    {
        cube ([LID_OUTSIDE_LONG_THICKNESS+ALL_EXTRA_SPACE, LID_OUTSIDE_SHORT_THICKNESS+ALL_EXTRA_SPACE, HEIGHT]); 		//*Top Main Body


        translate([ ((LID_OUTSIDE_LONG_THICKNESS+ALL_EXTRA_SPACE) / 2)-((TAB_THICKNESS+1)/2), -.5, WALL_THICKNESS]) 
        {
            cube ([(TAB_THICKNESS+1), LID_OUTSIDE_SHORT_THICKNESS + 2, Wedge_thickness+1.15 ]); 	//*Tab Hole
            
            TOP_CUTOUT_LENGTH = LID_OUTSIDE_SHORT_THICKNESS + 2;          
            translate([ ((TAB_THICKNESS+1)/2), 
                        0, 
                        -WALL_THICKNESS]) 
            translate([0,-1,HEIGHT*1.3]) 
                scale([END_CUTOUT_WIDTH_RATIO,1,1])
                    rotate([0,90,90]) 
                        cylinder(h=TOP_CUTOUT_LENGTH+2,r=END_CUTOUT_RADIUS);  //*End cutout
        }
        
        translate([WALL_THICKNESS,WALL_THICKNESS, WALL_THICKNESS]) 
            cube ([LID_OUTSIDE_LONG_THICKNESS - (WALL_THICKNESS*2)+ALL_EXTRA_SPACE,LID_OUTSIDE_SHORT_THICKNESS - (WALL_THICKNESS*2)+ALL_EXTRA_SPACE,HEIGHT]);//*Hole
        
        if (Cutout_hole_top == "true")
        {
            translate([(LID_OUTSIDE_LONG_THICKNESS+ALL_EXTRA_SPACE)/2,(LID_OUTSIDE_SHORT_THICKNESS+ALL_EXTRA_SPACE)/2,0]) 
                cutout_ellipse();
        }
        
        translate([textsize*1.2,(LID_OUTSIDE_SHORT_THICKNESS+ALL_EXTRA_SPACE)/2,-.1]) 
            writeit(Top_Text);
    }
}
//----------------------------

if (type=="bottom" || type=="both")
    bottom();

if (type=="top" || type=="both")
    translate([0, ( type=="both" ? SPACE_BETWEEN_BOTTOM_AND_LID_Y : 0 ) ,0])
        top();
